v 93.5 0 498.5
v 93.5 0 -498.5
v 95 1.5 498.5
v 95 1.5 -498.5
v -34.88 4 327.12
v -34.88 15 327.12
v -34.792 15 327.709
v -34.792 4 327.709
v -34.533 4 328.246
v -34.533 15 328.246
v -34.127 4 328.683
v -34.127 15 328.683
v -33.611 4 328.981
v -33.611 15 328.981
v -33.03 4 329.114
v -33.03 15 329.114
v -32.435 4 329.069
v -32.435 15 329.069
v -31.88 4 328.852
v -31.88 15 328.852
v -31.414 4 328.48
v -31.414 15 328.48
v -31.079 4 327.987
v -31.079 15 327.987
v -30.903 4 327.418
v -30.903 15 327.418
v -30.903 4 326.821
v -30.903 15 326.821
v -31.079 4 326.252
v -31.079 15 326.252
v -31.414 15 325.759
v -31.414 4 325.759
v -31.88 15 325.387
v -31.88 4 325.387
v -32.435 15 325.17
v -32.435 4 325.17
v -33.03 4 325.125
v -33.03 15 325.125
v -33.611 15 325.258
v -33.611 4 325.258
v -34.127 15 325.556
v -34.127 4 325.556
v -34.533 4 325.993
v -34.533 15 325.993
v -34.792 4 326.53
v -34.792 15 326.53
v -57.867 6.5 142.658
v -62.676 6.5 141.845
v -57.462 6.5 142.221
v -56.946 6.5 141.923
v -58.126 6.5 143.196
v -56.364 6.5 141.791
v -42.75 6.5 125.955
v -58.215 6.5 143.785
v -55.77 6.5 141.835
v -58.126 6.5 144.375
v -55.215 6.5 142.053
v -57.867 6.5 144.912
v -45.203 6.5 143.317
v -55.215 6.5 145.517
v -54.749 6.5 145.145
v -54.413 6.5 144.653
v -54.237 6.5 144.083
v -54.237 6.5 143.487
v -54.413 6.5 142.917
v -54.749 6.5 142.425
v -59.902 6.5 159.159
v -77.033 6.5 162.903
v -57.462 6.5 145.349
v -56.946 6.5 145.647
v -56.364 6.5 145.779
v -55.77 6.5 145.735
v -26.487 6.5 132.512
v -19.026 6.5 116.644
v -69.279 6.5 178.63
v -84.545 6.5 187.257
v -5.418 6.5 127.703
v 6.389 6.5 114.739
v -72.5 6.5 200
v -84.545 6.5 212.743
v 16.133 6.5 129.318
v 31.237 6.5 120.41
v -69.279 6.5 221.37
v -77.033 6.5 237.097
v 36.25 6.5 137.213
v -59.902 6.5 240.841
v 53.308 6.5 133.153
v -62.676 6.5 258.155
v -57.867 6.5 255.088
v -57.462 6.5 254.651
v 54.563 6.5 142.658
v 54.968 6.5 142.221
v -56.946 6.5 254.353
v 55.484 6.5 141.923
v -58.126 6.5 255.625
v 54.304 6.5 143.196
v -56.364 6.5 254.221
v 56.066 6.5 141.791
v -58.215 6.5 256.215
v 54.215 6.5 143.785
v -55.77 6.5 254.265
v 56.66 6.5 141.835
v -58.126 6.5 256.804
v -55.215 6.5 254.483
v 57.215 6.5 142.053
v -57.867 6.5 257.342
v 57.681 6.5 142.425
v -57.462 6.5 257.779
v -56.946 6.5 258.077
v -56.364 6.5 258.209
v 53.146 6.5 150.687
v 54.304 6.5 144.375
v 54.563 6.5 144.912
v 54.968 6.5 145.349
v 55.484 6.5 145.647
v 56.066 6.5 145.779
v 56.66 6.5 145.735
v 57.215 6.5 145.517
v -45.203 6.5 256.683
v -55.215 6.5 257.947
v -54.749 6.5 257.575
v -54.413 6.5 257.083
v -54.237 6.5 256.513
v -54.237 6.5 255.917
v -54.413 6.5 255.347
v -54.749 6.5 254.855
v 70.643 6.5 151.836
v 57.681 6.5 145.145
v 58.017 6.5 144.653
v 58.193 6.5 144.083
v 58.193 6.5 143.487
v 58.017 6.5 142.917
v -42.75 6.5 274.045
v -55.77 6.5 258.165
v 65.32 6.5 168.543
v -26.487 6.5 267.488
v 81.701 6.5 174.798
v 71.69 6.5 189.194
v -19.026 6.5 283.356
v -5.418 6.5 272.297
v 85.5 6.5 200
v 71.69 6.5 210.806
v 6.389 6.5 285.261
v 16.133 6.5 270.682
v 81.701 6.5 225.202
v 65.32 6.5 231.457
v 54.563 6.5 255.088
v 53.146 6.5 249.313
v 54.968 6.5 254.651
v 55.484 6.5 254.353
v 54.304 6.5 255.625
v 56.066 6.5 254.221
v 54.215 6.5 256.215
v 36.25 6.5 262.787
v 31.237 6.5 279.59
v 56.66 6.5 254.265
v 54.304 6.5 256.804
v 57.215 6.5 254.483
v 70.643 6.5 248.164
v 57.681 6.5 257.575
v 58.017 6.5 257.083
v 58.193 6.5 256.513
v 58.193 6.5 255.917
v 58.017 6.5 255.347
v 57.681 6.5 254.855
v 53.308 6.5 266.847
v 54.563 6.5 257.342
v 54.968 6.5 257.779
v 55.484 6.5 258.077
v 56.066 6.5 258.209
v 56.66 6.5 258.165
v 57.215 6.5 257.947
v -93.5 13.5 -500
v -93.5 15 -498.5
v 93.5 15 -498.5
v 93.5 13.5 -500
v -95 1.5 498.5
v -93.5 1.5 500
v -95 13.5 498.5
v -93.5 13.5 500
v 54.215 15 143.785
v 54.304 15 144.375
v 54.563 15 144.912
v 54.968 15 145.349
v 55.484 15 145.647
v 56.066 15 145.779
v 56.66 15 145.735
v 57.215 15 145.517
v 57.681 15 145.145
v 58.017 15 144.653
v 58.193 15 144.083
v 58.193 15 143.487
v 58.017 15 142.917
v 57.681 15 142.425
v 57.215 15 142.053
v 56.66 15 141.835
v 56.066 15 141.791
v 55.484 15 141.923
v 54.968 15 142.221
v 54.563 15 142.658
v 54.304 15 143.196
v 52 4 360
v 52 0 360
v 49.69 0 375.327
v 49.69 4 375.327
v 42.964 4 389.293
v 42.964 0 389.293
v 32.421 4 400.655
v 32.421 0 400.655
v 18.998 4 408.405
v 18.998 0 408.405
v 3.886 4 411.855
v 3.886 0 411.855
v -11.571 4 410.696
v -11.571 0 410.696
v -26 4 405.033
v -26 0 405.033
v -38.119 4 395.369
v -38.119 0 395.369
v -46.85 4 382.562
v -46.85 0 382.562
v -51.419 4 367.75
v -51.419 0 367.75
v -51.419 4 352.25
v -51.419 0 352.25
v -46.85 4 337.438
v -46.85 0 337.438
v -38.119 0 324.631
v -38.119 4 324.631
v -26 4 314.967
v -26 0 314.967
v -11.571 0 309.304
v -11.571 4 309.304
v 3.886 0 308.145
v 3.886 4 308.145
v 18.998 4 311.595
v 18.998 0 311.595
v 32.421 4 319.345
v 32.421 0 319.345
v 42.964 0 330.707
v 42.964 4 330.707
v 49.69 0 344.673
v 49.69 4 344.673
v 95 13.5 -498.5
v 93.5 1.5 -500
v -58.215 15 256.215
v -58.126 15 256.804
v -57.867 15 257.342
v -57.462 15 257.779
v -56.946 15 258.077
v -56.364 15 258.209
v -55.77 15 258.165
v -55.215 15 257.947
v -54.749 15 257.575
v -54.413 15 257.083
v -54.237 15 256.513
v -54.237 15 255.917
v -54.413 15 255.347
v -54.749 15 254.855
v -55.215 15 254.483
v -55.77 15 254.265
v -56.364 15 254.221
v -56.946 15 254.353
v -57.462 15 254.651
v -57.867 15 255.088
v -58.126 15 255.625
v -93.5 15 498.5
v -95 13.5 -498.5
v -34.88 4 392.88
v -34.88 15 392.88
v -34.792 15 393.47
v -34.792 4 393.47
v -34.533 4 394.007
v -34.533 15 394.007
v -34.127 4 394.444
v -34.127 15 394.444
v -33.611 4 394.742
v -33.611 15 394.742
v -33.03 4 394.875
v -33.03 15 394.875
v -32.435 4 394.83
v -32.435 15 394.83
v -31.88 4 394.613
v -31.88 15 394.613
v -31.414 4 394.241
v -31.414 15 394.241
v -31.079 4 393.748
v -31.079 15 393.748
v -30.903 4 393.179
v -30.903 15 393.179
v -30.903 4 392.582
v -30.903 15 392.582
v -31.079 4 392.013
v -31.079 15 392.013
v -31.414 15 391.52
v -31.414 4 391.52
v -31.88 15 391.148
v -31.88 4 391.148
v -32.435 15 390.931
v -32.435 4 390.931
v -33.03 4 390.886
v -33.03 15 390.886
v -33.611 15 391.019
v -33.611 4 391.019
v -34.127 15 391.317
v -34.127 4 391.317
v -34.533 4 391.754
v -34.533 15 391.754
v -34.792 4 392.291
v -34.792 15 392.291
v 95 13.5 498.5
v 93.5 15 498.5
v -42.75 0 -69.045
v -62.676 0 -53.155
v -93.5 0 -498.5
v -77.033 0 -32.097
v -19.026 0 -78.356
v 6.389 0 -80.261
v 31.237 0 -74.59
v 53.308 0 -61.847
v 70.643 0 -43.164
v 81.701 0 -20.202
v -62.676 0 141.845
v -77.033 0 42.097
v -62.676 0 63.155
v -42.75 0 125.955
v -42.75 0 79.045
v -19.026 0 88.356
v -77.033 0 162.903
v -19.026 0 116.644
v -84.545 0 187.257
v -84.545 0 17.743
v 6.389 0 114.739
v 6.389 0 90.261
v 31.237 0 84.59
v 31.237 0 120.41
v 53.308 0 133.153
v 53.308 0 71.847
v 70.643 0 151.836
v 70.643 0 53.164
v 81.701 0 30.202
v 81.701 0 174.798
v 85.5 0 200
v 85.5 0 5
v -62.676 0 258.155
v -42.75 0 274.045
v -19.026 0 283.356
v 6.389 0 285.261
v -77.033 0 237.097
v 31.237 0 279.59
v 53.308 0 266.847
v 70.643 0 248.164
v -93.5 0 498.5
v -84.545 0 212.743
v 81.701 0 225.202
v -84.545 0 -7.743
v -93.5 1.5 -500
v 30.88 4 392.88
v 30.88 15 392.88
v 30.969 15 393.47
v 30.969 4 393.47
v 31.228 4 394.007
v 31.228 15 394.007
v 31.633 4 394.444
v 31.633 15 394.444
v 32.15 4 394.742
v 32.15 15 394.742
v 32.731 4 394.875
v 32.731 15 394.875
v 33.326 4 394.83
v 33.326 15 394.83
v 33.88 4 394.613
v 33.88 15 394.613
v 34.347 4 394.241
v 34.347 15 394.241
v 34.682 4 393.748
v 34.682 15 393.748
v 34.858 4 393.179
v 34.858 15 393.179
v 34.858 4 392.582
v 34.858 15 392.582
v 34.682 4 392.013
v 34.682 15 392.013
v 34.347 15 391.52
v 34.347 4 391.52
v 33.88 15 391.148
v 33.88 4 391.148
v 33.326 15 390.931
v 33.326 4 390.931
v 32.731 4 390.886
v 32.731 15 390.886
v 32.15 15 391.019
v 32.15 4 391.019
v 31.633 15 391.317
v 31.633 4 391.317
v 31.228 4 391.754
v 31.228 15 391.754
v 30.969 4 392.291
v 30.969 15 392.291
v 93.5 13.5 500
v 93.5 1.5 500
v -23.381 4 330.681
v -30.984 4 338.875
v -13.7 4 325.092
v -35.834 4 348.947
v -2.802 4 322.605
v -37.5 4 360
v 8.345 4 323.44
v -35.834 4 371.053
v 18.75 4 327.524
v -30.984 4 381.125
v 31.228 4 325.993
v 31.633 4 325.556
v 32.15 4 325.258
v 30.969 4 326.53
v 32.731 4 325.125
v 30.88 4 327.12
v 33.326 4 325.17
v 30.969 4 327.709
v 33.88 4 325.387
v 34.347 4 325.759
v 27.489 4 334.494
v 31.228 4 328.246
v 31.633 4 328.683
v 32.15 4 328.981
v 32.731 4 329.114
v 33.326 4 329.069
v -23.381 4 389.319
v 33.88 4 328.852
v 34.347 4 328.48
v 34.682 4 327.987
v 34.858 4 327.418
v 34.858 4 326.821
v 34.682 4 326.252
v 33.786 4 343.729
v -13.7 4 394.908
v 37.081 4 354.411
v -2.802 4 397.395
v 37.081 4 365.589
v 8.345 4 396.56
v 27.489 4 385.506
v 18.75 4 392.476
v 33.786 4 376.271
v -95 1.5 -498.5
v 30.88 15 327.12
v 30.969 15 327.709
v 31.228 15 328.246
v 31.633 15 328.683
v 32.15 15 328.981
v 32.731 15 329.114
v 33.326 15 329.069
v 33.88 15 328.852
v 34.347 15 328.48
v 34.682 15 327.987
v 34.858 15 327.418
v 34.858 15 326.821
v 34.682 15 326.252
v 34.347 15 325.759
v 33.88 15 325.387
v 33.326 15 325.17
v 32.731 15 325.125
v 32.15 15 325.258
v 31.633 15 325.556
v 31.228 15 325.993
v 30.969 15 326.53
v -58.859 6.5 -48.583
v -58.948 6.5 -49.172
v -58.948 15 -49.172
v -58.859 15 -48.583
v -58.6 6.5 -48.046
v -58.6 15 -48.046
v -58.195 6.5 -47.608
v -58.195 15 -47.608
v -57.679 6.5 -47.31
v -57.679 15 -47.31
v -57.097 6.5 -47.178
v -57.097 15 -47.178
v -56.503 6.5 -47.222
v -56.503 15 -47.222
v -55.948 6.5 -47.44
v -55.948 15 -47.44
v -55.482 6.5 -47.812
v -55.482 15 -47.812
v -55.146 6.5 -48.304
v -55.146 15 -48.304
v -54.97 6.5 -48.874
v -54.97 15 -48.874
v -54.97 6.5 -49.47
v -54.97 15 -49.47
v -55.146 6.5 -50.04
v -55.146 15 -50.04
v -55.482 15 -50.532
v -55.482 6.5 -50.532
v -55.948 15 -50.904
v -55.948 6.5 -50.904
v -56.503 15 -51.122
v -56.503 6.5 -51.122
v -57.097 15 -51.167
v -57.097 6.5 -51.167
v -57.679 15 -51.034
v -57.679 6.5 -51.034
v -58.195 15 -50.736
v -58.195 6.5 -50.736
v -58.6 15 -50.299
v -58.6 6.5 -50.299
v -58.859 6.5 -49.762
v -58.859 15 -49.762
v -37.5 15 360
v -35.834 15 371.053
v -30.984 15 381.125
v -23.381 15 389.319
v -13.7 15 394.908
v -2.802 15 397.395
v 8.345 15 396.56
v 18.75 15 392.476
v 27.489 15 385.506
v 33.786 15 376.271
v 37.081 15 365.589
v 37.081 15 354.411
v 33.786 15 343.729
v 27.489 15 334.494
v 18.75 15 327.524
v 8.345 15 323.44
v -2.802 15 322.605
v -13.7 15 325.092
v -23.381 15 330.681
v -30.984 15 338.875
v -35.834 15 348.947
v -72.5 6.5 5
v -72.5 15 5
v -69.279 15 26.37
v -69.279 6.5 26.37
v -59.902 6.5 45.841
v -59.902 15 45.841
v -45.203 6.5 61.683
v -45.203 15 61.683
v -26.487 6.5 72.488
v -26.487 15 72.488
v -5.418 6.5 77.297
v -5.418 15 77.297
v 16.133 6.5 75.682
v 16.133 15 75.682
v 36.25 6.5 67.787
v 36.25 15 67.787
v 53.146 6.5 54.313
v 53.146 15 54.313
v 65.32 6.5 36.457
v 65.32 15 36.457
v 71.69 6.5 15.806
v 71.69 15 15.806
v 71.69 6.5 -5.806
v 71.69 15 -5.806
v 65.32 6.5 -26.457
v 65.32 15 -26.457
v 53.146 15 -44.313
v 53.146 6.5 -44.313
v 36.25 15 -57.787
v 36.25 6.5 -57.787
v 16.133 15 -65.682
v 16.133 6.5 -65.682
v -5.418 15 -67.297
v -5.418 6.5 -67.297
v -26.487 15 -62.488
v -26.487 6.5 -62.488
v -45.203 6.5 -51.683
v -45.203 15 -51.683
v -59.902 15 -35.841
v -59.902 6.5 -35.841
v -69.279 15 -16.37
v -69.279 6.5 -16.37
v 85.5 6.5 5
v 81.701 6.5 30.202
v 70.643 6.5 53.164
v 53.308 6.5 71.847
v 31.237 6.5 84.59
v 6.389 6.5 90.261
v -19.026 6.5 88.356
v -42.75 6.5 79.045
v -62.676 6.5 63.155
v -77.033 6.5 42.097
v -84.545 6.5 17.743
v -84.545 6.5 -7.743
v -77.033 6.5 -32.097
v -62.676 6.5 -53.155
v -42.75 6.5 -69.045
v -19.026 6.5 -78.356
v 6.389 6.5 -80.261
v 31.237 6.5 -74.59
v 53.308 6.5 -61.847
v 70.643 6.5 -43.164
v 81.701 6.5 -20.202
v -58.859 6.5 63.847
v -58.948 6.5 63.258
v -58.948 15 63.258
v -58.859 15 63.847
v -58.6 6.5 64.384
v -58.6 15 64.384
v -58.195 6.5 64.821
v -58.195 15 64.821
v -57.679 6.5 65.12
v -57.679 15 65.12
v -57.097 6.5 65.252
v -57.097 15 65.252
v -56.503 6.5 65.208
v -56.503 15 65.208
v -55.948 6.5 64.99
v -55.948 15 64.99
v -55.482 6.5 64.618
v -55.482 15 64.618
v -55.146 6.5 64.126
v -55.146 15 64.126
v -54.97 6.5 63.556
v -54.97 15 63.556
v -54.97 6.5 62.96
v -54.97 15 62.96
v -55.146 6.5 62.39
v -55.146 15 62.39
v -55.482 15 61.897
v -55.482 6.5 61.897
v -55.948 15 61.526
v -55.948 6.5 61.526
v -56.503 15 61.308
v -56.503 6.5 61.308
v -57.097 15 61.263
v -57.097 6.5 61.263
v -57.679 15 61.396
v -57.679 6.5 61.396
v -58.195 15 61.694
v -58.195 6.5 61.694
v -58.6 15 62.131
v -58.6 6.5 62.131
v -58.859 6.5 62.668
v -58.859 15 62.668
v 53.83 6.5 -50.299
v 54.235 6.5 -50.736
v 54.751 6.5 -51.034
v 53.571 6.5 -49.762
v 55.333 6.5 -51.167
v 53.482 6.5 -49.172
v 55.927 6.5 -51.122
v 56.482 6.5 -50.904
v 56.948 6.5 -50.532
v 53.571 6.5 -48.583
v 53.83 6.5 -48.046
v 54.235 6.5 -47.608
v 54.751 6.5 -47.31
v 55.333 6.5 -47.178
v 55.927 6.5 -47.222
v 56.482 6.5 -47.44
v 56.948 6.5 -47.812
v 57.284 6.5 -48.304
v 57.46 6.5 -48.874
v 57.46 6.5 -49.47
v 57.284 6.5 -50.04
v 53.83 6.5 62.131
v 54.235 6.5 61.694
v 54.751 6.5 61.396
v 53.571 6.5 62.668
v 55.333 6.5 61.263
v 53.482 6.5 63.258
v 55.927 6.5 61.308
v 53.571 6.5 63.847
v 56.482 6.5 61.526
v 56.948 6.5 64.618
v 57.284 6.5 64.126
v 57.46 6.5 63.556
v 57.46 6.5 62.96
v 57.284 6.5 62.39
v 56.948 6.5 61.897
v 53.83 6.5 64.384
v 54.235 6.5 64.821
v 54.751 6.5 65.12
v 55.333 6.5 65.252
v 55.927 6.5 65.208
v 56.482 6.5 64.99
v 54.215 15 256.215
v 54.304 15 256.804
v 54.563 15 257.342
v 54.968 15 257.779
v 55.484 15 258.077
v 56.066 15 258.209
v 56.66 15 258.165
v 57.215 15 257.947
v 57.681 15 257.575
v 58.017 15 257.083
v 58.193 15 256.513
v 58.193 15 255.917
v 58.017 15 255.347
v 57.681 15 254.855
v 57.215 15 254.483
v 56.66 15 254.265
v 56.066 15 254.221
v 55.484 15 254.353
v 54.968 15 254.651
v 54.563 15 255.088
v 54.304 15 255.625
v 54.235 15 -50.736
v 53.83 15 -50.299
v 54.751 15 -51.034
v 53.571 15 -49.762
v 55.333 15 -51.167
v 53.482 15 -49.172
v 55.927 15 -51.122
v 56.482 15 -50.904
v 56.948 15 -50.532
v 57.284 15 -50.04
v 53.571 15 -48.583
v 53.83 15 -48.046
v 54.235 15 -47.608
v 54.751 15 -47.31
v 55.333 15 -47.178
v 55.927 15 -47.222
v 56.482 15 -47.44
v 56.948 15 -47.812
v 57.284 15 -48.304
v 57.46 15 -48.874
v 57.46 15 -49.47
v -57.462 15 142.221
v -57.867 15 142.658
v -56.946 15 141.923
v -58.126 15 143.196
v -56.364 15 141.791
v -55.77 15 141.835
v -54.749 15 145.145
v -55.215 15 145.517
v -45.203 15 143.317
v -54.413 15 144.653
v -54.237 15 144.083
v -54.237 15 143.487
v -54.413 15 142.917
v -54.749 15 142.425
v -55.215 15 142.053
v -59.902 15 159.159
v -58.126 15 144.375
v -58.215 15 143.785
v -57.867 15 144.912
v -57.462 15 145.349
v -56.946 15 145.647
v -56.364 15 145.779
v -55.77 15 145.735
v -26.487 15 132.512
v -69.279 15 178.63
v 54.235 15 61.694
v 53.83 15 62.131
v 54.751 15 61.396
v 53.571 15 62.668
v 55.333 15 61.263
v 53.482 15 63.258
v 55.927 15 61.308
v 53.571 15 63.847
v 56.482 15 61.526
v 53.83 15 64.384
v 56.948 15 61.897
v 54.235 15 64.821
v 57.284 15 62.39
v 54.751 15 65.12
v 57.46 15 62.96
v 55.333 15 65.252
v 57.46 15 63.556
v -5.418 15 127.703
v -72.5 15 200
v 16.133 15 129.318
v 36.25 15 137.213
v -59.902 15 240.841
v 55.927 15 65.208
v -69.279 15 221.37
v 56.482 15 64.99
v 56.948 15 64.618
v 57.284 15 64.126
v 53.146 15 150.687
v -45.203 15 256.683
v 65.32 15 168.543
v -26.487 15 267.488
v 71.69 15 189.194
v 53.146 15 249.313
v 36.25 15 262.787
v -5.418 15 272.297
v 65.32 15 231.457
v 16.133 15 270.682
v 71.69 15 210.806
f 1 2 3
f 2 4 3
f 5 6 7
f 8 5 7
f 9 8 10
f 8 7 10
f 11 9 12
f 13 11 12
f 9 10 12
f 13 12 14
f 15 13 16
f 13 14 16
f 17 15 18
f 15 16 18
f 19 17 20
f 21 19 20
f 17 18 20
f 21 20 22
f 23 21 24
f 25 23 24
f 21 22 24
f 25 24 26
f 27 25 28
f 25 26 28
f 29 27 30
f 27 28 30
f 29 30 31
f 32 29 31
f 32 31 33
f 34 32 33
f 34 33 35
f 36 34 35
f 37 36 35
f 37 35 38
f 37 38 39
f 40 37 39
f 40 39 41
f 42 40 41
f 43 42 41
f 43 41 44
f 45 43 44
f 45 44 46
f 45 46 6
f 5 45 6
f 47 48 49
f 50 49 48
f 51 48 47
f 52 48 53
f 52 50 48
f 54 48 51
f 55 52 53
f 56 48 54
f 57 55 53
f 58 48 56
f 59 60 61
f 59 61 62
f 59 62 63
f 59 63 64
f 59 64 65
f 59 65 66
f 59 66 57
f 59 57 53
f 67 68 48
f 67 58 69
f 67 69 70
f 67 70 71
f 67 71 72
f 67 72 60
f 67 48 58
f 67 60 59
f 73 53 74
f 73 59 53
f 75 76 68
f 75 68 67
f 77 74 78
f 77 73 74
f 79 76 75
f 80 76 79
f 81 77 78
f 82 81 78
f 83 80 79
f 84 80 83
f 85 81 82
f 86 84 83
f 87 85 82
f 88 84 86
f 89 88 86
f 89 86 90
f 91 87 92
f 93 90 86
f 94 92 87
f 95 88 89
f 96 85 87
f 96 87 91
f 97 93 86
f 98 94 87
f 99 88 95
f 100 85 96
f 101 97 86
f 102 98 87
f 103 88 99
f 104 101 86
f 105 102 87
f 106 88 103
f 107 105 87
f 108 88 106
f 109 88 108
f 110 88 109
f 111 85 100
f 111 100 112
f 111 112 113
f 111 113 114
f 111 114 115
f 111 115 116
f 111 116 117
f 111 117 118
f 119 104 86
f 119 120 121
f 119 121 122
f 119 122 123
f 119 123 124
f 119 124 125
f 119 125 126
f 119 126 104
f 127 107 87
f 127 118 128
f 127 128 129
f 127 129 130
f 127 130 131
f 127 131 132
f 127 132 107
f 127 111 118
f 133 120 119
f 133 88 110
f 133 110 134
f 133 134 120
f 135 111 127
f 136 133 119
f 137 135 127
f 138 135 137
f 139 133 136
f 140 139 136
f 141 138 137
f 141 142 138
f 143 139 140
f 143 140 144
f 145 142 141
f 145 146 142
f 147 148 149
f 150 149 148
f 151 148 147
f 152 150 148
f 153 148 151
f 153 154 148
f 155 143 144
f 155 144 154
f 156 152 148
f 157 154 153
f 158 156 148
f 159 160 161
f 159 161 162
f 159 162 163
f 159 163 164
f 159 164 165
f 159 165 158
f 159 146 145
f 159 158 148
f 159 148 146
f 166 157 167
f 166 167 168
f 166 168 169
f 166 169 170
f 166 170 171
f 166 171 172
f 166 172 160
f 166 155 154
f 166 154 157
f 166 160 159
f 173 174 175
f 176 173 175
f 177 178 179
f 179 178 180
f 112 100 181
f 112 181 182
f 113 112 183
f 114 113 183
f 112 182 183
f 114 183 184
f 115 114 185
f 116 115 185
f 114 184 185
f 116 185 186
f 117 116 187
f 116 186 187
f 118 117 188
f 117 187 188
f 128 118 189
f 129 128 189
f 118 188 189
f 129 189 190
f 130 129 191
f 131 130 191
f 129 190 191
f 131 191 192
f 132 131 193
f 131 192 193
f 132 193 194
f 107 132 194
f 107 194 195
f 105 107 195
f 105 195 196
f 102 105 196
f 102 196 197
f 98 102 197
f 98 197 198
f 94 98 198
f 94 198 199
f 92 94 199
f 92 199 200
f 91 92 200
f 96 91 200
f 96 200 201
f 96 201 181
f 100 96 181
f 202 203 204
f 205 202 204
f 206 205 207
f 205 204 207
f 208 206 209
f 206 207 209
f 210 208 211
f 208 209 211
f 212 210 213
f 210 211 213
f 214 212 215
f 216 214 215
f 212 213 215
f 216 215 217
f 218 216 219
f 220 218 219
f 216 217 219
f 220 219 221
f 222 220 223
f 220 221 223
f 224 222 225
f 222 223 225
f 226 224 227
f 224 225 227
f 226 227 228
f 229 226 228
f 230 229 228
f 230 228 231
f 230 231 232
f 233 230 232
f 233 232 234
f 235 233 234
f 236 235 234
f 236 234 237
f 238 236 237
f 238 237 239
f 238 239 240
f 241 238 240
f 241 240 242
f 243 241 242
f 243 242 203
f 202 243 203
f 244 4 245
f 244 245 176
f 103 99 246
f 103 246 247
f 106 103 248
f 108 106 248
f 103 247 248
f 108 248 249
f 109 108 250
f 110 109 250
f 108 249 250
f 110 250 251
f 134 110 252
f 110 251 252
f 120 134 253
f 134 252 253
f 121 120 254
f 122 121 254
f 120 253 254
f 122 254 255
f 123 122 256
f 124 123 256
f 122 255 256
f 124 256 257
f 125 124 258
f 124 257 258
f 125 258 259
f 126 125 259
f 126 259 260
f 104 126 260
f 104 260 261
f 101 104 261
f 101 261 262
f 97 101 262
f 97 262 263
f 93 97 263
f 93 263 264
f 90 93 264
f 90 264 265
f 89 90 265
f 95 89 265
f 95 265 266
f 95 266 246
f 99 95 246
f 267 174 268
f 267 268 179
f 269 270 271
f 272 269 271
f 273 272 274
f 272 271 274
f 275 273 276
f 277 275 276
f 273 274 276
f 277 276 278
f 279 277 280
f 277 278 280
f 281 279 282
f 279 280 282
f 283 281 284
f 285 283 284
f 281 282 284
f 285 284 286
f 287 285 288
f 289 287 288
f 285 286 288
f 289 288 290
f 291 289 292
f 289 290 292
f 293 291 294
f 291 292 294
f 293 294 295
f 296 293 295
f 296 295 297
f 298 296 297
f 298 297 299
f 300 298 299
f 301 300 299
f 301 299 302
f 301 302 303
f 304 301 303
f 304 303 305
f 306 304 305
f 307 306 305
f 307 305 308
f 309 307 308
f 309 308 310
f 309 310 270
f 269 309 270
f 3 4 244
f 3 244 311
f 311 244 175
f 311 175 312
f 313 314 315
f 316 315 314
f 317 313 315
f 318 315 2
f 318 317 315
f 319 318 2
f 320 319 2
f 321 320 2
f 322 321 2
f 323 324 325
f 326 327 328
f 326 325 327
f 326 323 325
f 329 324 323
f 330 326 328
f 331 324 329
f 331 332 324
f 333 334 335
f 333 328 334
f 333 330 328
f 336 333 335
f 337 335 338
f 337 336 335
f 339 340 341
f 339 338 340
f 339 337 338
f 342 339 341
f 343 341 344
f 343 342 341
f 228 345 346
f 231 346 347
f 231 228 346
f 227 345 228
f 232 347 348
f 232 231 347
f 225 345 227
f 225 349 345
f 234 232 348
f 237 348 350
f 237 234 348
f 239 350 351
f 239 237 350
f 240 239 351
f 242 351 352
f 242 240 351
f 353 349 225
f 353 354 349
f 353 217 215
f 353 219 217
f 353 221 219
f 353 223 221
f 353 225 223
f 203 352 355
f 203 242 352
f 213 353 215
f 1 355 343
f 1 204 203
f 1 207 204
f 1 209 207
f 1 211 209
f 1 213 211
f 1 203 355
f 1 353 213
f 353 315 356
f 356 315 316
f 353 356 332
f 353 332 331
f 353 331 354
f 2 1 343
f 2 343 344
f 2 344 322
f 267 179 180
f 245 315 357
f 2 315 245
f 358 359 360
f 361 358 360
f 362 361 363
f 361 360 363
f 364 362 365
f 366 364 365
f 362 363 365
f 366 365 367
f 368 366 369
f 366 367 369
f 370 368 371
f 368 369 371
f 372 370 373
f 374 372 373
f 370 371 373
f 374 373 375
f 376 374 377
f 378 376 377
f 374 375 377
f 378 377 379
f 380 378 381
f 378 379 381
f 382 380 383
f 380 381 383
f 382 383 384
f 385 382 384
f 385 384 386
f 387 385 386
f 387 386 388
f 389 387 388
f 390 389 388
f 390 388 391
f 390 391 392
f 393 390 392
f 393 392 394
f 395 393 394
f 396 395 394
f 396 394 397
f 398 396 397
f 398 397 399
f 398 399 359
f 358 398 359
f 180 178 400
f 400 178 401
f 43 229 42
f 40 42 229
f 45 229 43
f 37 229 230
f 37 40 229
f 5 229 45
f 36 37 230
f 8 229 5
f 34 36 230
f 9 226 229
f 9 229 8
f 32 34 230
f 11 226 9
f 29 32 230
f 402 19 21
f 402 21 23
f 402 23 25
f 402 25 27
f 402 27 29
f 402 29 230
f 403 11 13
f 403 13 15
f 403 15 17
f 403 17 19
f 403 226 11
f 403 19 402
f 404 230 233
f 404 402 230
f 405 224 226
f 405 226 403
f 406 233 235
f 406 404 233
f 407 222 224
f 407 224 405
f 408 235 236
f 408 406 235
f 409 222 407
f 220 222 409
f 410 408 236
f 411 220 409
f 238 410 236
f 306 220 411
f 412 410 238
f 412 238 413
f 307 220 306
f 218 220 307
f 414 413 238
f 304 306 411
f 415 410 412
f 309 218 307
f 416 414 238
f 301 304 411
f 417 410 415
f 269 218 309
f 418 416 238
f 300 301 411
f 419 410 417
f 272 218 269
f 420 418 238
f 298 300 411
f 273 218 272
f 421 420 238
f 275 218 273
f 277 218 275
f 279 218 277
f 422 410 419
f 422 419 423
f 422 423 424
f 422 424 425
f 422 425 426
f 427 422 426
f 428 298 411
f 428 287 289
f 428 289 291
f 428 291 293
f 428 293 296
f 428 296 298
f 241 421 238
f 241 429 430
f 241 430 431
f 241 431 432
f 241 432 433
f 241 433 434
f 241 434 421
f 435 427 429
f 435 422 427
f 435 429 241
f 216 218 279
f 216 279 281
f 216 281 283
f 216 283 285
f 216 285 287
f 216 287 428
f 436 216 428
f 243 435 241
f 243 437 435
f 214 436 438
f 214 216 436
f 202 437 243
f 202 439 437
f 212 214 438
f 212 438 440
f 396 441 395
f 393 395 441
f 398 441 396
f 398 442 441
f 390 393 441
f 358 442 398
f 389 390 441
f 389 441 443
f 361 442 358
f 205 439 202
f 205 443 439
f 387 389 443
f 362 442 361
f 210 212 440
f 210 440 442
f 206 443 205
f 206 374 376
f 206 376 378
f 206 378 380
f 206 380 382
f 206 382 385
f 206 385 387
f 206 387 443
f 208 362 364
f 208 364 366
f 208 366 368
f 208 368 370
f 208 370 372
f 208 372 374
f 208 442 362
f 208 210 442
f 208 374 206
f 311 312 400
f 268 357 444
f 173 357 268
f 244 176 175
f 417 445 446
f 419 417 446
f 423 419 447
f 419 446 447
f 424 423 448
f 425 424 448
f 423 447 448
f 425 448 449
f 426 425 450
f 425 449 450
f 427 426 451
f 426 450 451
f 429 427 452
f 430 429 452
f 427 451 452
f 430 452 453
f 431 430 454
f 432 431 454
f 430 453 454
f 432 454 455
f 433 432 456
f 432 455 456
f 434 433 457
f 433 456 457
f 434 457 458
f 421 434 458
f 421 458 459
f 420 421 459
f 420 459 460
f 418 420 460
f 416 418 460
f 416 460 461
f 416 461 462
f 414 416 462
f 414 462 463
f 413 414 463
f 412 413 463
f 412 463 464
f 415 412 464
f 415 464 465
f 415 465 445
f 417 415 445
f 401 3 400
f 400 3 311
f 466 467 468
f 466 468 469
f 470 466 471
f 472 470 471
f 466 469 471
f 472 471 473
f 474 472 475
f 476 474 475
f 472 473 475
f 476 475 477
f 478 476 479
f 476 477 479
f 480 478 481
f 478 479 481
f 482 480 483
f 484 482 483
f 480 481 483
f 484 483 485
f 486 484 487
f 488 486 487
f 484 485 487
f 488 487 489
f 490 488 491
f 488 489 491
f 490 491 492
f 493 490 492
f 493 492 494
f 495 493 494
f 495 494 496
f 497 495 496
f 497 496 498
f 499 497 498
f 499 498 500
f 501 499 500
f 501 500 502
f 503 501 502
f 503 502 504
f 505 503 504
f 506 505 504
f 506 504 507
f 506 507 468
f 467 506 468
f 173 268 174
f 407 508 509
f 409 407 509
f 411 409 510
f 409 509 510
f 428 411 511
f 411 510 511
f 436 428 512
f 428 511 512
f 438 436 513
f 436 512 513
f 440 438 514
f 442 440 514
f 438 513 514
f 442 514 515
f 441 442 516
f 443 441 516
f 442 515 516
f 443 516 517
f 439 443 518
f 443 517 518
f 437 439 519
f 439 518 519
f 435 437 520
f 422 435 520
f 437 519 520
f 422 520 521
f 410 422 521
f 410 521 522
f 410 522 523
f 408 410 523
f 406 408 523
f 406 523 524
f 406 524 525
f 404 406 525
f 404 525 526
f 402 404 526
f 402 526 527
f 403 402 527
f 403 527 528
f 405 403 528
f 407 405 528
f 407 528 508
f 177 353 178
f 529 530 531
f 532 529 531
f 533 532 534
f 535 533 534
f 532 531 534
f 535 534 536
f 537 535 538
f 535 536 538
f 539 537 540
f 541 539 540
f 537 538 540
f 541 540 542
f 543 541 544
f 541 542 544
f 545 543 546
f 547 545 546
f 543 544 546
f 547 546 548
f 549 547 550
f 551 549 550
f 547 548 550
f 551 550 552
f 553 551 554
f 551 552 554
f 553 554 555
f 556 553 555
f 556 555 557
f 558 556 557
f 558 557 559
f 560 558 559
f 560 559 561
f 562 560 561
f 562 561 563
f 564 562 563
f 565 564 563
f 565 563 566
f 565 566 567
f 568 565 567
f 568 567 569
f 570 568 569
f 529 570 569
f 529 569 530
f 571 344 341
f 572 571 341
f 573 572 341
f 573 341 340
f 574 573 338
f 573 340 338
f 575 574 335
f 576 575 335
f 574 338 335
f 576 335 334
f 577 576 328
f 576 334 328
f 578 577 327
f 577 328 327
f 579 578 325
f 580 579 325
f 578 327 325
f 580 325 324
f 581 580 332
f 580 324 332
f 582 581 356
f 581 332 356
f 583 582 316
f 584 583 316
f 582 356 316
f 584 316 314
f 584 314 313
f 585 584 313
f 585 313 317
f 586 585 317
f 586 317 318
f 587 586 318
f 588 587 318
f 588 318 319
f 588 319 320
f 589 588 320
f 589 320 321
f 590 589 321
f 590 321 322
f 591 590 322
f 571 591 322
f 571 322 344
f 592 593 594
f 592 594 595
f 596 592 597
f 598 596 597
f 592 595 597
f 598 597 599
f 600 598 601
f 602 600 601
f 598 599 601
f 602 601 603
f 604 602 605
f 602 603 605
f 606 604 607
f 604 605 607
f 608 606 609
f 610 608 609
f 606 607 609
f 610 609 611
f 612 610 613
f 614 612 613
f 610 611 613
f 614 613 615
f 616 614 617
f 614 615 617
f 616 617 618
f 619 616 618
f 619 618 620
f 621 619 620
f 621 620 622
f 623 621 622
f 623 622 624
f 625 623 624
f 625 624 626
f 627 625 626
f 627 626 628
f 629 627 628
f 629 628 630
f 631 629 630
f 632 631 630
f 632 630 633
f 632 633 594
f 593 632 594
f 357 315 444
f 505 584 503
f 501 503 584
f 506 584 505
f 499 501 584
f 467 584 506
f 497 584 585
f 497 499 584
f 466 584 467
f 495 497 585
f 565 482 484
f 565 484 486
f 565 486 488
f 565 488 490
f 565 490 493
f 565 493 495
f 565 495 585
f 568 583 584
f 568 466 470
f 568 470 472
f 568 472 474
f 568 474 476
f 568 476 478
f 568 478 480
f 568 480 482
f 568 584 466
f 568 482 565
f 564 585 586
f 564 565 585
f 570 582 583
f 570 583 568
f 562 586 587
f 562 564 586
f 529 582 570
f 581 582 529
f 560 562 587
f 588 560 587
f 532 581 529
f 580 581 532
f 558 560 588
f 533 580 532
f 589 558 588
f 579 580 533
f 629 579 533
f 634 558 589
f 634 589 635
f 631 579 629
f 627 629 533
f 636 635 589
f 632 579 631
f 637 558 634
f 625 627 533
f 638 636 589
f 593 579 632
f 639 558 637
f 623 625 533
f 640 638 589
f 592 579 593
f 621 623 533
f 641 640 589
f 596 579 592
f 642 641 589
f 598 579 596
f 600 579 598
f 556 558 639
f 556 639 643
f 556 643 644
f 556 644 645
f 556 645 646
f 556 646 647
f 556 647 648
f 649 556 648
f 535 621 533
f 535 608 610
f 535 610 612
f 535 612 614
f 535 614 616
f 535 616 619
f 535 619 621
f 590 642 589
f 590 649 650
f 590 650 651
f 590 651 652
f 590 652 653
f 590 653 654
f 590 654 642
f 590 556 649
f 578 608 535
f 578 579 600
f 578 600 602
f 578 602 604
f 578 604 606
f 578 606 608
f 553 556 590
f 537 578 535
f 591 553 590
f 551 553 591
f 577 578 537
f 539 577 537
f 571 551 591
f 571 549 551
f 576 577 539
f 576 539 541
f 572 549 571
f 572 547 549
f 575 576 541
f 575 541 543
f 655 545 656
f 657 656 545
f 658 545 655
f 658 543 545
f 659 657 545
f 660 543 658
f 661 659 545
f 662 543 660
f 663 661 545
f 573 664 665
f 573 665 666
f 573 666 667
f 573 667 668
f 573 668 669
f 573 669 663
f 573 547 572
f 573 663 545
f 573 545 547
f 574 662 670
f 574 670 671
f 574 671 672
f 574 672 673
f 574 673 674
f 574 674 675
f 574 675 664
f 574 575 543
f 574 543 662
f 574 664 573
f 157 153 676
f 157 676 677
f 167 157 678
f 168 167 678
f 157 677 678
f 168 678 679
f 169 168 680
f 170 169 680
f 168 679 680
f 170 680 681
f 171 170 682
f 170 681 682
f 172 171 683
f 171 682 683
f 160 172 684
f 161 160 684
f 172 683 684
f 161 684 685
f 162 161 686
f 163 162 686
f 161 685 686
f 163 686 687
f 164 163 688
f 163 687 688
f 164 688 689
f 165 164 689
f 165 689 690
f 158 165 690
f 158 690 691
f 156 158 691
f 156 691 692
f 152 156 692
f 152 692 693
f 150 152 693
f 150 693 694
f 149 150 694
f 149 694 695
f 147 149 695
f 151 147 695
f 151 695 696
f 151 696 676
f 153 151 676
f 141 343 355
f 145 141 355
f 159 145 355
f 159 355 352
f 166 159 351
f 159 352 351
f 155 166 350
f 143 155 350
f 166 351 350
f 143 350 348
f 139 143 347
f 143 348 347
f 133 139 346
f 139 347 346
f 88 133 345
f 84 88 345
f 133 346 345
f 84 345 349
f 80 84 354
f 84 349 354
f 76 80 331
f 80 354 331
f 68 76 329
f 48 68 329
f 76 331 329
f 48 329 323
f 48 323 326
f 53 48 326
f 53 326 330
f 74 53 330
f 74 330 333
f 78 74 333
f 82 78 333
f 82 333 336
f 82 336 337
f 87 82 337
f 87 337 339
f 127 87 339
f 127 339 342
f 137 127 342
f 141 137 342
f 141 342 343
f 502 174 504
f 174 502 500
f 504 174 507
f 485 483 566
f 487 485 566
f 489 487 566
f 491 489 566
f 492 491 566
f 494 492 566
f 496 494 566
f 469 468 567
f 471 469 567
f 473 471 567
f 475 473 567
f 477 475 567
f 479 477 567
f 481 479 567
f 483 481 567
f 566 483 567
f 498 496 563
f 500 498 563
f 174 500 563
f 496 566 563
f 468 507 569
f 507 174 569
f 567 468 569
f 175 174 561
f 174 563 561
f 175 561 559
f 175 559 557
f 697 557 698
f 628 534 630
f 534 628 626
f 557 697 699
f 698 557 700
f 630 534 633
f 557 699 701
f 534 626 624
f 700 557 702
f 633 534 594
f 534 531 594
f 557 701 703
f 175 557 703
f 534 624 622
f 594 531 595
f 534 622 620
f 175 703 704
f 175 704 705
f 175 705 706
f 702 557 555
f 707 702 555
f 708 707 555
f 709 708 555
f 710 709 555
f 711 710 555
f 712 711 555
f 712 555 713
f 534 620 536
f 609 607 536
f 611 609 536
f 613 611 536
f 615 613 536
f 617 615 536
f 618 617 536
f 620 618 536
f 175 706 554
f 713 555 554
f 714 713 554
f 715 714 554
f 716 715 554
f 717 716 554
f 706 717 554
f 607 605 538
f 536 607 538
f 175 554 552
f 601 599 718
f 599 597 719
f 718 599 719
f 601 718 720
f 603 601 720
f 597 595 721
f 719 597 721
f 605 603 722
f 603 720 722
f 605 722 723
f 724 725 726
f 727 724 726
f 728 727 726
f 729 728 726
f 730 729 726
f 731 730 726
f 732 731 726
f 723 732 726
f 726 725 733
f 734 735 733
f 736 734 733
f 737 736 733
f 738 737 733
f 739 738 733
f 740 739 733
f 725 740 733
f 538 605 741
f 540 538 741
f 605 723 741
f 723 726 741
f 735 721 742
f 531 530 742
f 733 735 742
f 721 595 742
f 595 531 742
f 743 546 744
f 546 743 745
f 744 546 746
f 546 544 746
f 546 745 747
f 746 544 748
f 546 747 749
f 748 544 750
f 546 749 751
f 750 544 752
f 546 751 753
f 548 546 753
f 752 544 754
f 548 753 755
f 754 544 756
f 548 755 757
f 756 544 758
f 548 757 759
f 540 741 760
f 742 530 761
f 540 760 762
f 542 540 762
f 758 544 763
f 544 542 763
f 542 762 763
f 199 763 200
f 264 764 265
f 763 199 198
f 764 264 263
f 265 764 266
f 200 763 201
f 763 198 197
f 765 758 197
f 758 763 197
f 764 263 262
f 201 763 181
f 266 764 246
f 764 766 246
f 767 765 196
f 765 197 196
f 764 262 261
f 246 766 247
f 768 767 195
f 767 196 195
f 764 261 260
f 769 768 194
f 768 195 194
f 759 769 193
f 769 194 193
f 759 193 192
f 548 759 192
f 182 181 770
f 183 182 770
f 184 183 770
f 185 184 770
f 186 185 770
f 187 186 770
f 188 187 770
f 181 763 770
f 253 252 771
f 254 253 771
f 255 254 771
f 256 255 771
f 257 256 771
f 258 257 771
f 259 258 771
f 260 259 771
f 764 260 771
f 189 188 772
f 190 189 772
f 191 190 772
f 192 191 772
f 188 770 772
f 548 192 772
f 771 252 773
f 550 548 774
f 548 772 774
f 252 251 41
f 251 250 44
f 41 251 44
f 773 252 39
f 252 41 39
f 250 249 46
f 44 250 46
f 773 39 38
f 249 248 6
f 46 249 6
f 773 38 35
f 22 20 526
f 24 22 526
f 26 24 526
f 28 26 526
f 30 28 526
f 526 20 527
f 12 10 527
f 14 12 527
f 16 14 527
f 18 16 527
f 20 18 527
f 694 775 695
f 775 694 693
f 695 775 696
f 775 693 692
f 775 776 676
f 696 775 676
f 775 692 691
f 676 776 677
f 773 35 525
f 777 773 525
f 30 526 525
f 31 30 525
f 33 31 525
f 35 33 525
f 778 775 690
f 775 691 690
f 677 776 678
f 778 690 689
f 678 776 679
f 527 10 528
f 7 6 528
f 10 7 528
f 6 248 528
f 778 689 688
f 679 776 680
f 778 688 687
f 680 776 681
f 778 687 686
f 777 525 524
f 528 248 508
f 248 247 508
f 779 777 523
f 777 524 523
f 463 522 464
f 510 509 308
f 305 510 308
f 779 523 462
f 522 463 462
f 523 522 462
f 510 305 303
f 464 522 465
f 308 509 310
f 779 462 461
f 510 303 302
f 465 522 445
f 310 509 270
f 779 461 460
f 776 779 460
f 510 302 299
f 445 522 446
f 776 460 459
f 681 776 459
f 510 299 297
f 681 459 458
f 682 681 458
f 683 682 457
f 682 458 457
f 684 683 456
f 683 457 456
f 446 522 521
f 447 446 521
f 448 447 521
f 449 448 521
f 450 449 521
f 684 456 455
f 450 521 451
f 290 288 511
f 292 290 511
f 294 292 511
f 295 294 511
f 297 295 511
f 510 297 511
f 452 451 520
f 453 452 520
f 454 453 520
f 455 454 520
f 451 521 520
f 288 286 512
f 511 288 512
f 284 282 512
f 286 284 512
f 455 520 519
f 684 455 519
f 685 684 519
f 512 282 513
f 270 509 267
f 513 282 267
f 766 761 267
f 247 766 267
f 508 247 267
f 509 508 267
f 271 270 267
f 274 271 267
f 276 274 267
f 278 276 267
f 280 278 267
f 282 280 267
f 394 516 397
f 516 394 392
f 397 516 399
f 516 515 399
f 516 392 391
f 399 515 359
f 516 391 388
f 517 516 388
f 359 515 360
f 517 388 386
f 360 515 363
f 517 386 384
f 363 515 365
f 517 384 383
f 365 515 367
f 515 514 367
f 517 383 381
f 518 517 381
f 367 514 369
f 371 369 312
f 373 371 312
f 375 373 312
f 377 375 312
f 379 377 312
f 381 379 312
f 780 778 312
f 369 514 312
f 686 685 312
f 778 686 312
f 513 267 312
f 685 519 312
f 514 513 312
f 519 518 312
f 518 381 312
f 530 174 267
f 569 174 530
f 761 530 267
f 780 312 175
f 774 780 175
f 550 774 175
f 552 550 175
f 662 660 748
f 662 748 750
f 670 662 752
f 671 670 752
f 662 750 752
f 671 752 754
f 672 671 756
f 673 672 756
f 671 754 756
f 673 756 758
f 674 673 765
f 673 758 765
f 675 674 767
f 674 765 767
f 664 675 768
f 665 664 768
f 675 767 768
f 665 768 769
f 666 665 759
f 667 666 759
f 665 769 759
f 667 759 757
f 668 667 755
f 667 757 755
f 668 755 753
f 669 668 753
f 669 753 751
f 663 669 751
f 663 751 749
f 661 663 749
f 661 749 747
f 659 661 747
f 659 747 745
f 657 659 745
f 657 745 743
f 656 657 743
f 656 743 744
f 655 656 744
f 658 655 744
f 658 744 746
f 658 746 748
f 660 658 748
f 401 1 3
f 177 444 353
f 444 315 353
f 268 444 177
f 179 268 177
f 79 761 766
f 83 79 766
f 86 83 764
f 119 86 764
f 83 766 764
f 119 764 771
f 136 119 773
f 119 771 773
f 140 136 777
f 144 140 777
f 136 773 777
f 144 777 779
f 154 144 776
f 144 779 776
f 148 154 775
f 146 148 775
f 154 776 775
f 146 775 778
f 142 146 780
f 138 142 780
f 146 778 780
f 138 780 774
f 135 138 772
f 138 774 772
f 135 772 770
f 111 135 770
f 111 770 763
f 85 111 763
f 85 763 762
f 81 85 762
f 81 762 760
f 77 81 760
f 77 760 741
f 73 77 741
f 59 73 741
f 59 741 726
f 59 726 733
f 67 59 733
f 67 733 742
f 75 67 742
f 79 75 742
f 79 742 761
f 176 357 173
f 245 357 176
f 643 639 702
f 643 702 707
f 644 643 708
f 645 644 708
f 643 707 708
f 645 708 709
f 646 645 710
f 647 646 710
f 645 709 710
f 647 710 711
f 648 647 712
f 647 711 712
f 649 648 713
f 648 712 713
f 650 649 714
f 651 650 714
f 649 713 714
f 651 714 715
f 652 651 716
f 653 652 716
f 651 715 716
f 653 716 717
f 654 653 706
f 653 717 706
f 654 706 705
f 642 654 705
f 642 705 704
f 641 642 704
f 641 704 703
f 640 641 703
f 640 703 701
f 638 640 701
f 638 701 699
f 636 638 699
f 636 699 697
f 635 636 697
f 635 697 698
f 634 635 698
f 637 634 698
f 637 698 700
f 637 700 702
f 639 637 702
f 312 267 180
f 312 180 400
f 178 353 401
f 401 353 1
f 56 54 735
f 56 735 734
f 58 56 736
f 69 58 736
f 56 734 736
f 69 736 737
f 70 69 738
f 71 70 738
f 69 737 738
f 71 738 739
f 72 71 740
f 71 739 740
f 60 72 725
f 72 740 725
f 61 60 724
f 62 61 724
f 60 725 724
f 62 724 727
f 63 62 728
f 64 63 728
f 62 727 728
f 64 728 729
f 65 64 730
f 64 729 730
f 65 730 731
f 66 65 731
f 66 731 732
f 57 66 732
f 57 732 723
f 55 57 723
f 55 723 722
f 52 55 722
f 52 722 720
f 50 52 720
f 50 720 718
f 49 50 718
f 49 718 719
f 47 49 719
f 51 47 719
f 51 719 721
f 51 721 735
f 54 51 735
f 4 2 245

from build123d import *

# Parameters (mm, degrees)
F0_W           = 190
F0_H           = 1000
F1_DEPTH       = 15
F2_D           = 75
F2_DEPTH       = 15
F2_CBORE_D     = 104
F2_CBORE_DEPTH = 4
F3_D           = 145
F3_DEPTH       = 15
F3_CBORE_D     = 171
F3_CBORE_DEPTH = 6.5
F4_D           = 145
F4_DEPTH       = 15
F4_CBORE_D     = 171
F4_CBORE_DEPTH = 6.5
F5_D           = 4
F5_DEPTH       = 15
F6_SIZE        = 1.5


with BuildPart() as f1:
    # F0 (on Front) → F1 (new body)
    with BuildSketch(Plane.XZ):
        Rectangle(F0_W, F0_H)
    extrude(amount=-F1_DEPTH)

    # F2
    with Locations(Plane.XZ):
        with Locations((0, 360)):
            CounterBoreHole(F2_D / 2, F2_CBORE_D / 2, F2_CBORE_DEPTH, depth=F2_DEPTH)

    # F3
    with Locations(Plane.XZ):
        with Locations((0, 200)):
            CounterBoreHole(F3_D / 2, F3_CBORE_D / 2, F3_CBORE_DEPTH, depth=F3_DEPTH)

    # F4
    with Locations(Plane.XZ):
        with Locations((0, 5)):
            CounterBoreHole(F4_D / 2, F4_CBORE_D / 2, F4_CBORE_DEPTH, depth=F4_DEPTH)

    # F5
    with Locations(Plane.XZ):
        with Locations((-56.214989, 256.214989), (56.214989, 256.214989), (56.214989, 143.785011), (-56.214989, 143.785011), (-56.947881, 63.257827), (55.482097, 63.257827), (55.482097, -49.172151), (-56.947881, -49.172151), (-32.880465, 392.880465), (32.880465, 392.880465), (32.880465, 327.119535), (-32.880465, 327.119535)):
            Hole(F5_D / 2, depth=F5_DEPTH)

    # F6
    f6_edges = [f1.edges().sort_by_distance(p)[0] for p in [
        (-95, 0, 0),
        (0, 0, 500),
        (95, 0, 0),
        (0, 0, -500),
        (-95, 7.5, -500),
        (-95, 15, 0),
        (0, 15, -500),
        (95, 7.5, -500),
        (95, 15, 0),
        (-95, 7.5, 500),
        (0, 15, 500),
        (95, 7.5, 500),
    ]]
    chamfer(f6_edges, length=F6_SIZE)


solid = f1.part
